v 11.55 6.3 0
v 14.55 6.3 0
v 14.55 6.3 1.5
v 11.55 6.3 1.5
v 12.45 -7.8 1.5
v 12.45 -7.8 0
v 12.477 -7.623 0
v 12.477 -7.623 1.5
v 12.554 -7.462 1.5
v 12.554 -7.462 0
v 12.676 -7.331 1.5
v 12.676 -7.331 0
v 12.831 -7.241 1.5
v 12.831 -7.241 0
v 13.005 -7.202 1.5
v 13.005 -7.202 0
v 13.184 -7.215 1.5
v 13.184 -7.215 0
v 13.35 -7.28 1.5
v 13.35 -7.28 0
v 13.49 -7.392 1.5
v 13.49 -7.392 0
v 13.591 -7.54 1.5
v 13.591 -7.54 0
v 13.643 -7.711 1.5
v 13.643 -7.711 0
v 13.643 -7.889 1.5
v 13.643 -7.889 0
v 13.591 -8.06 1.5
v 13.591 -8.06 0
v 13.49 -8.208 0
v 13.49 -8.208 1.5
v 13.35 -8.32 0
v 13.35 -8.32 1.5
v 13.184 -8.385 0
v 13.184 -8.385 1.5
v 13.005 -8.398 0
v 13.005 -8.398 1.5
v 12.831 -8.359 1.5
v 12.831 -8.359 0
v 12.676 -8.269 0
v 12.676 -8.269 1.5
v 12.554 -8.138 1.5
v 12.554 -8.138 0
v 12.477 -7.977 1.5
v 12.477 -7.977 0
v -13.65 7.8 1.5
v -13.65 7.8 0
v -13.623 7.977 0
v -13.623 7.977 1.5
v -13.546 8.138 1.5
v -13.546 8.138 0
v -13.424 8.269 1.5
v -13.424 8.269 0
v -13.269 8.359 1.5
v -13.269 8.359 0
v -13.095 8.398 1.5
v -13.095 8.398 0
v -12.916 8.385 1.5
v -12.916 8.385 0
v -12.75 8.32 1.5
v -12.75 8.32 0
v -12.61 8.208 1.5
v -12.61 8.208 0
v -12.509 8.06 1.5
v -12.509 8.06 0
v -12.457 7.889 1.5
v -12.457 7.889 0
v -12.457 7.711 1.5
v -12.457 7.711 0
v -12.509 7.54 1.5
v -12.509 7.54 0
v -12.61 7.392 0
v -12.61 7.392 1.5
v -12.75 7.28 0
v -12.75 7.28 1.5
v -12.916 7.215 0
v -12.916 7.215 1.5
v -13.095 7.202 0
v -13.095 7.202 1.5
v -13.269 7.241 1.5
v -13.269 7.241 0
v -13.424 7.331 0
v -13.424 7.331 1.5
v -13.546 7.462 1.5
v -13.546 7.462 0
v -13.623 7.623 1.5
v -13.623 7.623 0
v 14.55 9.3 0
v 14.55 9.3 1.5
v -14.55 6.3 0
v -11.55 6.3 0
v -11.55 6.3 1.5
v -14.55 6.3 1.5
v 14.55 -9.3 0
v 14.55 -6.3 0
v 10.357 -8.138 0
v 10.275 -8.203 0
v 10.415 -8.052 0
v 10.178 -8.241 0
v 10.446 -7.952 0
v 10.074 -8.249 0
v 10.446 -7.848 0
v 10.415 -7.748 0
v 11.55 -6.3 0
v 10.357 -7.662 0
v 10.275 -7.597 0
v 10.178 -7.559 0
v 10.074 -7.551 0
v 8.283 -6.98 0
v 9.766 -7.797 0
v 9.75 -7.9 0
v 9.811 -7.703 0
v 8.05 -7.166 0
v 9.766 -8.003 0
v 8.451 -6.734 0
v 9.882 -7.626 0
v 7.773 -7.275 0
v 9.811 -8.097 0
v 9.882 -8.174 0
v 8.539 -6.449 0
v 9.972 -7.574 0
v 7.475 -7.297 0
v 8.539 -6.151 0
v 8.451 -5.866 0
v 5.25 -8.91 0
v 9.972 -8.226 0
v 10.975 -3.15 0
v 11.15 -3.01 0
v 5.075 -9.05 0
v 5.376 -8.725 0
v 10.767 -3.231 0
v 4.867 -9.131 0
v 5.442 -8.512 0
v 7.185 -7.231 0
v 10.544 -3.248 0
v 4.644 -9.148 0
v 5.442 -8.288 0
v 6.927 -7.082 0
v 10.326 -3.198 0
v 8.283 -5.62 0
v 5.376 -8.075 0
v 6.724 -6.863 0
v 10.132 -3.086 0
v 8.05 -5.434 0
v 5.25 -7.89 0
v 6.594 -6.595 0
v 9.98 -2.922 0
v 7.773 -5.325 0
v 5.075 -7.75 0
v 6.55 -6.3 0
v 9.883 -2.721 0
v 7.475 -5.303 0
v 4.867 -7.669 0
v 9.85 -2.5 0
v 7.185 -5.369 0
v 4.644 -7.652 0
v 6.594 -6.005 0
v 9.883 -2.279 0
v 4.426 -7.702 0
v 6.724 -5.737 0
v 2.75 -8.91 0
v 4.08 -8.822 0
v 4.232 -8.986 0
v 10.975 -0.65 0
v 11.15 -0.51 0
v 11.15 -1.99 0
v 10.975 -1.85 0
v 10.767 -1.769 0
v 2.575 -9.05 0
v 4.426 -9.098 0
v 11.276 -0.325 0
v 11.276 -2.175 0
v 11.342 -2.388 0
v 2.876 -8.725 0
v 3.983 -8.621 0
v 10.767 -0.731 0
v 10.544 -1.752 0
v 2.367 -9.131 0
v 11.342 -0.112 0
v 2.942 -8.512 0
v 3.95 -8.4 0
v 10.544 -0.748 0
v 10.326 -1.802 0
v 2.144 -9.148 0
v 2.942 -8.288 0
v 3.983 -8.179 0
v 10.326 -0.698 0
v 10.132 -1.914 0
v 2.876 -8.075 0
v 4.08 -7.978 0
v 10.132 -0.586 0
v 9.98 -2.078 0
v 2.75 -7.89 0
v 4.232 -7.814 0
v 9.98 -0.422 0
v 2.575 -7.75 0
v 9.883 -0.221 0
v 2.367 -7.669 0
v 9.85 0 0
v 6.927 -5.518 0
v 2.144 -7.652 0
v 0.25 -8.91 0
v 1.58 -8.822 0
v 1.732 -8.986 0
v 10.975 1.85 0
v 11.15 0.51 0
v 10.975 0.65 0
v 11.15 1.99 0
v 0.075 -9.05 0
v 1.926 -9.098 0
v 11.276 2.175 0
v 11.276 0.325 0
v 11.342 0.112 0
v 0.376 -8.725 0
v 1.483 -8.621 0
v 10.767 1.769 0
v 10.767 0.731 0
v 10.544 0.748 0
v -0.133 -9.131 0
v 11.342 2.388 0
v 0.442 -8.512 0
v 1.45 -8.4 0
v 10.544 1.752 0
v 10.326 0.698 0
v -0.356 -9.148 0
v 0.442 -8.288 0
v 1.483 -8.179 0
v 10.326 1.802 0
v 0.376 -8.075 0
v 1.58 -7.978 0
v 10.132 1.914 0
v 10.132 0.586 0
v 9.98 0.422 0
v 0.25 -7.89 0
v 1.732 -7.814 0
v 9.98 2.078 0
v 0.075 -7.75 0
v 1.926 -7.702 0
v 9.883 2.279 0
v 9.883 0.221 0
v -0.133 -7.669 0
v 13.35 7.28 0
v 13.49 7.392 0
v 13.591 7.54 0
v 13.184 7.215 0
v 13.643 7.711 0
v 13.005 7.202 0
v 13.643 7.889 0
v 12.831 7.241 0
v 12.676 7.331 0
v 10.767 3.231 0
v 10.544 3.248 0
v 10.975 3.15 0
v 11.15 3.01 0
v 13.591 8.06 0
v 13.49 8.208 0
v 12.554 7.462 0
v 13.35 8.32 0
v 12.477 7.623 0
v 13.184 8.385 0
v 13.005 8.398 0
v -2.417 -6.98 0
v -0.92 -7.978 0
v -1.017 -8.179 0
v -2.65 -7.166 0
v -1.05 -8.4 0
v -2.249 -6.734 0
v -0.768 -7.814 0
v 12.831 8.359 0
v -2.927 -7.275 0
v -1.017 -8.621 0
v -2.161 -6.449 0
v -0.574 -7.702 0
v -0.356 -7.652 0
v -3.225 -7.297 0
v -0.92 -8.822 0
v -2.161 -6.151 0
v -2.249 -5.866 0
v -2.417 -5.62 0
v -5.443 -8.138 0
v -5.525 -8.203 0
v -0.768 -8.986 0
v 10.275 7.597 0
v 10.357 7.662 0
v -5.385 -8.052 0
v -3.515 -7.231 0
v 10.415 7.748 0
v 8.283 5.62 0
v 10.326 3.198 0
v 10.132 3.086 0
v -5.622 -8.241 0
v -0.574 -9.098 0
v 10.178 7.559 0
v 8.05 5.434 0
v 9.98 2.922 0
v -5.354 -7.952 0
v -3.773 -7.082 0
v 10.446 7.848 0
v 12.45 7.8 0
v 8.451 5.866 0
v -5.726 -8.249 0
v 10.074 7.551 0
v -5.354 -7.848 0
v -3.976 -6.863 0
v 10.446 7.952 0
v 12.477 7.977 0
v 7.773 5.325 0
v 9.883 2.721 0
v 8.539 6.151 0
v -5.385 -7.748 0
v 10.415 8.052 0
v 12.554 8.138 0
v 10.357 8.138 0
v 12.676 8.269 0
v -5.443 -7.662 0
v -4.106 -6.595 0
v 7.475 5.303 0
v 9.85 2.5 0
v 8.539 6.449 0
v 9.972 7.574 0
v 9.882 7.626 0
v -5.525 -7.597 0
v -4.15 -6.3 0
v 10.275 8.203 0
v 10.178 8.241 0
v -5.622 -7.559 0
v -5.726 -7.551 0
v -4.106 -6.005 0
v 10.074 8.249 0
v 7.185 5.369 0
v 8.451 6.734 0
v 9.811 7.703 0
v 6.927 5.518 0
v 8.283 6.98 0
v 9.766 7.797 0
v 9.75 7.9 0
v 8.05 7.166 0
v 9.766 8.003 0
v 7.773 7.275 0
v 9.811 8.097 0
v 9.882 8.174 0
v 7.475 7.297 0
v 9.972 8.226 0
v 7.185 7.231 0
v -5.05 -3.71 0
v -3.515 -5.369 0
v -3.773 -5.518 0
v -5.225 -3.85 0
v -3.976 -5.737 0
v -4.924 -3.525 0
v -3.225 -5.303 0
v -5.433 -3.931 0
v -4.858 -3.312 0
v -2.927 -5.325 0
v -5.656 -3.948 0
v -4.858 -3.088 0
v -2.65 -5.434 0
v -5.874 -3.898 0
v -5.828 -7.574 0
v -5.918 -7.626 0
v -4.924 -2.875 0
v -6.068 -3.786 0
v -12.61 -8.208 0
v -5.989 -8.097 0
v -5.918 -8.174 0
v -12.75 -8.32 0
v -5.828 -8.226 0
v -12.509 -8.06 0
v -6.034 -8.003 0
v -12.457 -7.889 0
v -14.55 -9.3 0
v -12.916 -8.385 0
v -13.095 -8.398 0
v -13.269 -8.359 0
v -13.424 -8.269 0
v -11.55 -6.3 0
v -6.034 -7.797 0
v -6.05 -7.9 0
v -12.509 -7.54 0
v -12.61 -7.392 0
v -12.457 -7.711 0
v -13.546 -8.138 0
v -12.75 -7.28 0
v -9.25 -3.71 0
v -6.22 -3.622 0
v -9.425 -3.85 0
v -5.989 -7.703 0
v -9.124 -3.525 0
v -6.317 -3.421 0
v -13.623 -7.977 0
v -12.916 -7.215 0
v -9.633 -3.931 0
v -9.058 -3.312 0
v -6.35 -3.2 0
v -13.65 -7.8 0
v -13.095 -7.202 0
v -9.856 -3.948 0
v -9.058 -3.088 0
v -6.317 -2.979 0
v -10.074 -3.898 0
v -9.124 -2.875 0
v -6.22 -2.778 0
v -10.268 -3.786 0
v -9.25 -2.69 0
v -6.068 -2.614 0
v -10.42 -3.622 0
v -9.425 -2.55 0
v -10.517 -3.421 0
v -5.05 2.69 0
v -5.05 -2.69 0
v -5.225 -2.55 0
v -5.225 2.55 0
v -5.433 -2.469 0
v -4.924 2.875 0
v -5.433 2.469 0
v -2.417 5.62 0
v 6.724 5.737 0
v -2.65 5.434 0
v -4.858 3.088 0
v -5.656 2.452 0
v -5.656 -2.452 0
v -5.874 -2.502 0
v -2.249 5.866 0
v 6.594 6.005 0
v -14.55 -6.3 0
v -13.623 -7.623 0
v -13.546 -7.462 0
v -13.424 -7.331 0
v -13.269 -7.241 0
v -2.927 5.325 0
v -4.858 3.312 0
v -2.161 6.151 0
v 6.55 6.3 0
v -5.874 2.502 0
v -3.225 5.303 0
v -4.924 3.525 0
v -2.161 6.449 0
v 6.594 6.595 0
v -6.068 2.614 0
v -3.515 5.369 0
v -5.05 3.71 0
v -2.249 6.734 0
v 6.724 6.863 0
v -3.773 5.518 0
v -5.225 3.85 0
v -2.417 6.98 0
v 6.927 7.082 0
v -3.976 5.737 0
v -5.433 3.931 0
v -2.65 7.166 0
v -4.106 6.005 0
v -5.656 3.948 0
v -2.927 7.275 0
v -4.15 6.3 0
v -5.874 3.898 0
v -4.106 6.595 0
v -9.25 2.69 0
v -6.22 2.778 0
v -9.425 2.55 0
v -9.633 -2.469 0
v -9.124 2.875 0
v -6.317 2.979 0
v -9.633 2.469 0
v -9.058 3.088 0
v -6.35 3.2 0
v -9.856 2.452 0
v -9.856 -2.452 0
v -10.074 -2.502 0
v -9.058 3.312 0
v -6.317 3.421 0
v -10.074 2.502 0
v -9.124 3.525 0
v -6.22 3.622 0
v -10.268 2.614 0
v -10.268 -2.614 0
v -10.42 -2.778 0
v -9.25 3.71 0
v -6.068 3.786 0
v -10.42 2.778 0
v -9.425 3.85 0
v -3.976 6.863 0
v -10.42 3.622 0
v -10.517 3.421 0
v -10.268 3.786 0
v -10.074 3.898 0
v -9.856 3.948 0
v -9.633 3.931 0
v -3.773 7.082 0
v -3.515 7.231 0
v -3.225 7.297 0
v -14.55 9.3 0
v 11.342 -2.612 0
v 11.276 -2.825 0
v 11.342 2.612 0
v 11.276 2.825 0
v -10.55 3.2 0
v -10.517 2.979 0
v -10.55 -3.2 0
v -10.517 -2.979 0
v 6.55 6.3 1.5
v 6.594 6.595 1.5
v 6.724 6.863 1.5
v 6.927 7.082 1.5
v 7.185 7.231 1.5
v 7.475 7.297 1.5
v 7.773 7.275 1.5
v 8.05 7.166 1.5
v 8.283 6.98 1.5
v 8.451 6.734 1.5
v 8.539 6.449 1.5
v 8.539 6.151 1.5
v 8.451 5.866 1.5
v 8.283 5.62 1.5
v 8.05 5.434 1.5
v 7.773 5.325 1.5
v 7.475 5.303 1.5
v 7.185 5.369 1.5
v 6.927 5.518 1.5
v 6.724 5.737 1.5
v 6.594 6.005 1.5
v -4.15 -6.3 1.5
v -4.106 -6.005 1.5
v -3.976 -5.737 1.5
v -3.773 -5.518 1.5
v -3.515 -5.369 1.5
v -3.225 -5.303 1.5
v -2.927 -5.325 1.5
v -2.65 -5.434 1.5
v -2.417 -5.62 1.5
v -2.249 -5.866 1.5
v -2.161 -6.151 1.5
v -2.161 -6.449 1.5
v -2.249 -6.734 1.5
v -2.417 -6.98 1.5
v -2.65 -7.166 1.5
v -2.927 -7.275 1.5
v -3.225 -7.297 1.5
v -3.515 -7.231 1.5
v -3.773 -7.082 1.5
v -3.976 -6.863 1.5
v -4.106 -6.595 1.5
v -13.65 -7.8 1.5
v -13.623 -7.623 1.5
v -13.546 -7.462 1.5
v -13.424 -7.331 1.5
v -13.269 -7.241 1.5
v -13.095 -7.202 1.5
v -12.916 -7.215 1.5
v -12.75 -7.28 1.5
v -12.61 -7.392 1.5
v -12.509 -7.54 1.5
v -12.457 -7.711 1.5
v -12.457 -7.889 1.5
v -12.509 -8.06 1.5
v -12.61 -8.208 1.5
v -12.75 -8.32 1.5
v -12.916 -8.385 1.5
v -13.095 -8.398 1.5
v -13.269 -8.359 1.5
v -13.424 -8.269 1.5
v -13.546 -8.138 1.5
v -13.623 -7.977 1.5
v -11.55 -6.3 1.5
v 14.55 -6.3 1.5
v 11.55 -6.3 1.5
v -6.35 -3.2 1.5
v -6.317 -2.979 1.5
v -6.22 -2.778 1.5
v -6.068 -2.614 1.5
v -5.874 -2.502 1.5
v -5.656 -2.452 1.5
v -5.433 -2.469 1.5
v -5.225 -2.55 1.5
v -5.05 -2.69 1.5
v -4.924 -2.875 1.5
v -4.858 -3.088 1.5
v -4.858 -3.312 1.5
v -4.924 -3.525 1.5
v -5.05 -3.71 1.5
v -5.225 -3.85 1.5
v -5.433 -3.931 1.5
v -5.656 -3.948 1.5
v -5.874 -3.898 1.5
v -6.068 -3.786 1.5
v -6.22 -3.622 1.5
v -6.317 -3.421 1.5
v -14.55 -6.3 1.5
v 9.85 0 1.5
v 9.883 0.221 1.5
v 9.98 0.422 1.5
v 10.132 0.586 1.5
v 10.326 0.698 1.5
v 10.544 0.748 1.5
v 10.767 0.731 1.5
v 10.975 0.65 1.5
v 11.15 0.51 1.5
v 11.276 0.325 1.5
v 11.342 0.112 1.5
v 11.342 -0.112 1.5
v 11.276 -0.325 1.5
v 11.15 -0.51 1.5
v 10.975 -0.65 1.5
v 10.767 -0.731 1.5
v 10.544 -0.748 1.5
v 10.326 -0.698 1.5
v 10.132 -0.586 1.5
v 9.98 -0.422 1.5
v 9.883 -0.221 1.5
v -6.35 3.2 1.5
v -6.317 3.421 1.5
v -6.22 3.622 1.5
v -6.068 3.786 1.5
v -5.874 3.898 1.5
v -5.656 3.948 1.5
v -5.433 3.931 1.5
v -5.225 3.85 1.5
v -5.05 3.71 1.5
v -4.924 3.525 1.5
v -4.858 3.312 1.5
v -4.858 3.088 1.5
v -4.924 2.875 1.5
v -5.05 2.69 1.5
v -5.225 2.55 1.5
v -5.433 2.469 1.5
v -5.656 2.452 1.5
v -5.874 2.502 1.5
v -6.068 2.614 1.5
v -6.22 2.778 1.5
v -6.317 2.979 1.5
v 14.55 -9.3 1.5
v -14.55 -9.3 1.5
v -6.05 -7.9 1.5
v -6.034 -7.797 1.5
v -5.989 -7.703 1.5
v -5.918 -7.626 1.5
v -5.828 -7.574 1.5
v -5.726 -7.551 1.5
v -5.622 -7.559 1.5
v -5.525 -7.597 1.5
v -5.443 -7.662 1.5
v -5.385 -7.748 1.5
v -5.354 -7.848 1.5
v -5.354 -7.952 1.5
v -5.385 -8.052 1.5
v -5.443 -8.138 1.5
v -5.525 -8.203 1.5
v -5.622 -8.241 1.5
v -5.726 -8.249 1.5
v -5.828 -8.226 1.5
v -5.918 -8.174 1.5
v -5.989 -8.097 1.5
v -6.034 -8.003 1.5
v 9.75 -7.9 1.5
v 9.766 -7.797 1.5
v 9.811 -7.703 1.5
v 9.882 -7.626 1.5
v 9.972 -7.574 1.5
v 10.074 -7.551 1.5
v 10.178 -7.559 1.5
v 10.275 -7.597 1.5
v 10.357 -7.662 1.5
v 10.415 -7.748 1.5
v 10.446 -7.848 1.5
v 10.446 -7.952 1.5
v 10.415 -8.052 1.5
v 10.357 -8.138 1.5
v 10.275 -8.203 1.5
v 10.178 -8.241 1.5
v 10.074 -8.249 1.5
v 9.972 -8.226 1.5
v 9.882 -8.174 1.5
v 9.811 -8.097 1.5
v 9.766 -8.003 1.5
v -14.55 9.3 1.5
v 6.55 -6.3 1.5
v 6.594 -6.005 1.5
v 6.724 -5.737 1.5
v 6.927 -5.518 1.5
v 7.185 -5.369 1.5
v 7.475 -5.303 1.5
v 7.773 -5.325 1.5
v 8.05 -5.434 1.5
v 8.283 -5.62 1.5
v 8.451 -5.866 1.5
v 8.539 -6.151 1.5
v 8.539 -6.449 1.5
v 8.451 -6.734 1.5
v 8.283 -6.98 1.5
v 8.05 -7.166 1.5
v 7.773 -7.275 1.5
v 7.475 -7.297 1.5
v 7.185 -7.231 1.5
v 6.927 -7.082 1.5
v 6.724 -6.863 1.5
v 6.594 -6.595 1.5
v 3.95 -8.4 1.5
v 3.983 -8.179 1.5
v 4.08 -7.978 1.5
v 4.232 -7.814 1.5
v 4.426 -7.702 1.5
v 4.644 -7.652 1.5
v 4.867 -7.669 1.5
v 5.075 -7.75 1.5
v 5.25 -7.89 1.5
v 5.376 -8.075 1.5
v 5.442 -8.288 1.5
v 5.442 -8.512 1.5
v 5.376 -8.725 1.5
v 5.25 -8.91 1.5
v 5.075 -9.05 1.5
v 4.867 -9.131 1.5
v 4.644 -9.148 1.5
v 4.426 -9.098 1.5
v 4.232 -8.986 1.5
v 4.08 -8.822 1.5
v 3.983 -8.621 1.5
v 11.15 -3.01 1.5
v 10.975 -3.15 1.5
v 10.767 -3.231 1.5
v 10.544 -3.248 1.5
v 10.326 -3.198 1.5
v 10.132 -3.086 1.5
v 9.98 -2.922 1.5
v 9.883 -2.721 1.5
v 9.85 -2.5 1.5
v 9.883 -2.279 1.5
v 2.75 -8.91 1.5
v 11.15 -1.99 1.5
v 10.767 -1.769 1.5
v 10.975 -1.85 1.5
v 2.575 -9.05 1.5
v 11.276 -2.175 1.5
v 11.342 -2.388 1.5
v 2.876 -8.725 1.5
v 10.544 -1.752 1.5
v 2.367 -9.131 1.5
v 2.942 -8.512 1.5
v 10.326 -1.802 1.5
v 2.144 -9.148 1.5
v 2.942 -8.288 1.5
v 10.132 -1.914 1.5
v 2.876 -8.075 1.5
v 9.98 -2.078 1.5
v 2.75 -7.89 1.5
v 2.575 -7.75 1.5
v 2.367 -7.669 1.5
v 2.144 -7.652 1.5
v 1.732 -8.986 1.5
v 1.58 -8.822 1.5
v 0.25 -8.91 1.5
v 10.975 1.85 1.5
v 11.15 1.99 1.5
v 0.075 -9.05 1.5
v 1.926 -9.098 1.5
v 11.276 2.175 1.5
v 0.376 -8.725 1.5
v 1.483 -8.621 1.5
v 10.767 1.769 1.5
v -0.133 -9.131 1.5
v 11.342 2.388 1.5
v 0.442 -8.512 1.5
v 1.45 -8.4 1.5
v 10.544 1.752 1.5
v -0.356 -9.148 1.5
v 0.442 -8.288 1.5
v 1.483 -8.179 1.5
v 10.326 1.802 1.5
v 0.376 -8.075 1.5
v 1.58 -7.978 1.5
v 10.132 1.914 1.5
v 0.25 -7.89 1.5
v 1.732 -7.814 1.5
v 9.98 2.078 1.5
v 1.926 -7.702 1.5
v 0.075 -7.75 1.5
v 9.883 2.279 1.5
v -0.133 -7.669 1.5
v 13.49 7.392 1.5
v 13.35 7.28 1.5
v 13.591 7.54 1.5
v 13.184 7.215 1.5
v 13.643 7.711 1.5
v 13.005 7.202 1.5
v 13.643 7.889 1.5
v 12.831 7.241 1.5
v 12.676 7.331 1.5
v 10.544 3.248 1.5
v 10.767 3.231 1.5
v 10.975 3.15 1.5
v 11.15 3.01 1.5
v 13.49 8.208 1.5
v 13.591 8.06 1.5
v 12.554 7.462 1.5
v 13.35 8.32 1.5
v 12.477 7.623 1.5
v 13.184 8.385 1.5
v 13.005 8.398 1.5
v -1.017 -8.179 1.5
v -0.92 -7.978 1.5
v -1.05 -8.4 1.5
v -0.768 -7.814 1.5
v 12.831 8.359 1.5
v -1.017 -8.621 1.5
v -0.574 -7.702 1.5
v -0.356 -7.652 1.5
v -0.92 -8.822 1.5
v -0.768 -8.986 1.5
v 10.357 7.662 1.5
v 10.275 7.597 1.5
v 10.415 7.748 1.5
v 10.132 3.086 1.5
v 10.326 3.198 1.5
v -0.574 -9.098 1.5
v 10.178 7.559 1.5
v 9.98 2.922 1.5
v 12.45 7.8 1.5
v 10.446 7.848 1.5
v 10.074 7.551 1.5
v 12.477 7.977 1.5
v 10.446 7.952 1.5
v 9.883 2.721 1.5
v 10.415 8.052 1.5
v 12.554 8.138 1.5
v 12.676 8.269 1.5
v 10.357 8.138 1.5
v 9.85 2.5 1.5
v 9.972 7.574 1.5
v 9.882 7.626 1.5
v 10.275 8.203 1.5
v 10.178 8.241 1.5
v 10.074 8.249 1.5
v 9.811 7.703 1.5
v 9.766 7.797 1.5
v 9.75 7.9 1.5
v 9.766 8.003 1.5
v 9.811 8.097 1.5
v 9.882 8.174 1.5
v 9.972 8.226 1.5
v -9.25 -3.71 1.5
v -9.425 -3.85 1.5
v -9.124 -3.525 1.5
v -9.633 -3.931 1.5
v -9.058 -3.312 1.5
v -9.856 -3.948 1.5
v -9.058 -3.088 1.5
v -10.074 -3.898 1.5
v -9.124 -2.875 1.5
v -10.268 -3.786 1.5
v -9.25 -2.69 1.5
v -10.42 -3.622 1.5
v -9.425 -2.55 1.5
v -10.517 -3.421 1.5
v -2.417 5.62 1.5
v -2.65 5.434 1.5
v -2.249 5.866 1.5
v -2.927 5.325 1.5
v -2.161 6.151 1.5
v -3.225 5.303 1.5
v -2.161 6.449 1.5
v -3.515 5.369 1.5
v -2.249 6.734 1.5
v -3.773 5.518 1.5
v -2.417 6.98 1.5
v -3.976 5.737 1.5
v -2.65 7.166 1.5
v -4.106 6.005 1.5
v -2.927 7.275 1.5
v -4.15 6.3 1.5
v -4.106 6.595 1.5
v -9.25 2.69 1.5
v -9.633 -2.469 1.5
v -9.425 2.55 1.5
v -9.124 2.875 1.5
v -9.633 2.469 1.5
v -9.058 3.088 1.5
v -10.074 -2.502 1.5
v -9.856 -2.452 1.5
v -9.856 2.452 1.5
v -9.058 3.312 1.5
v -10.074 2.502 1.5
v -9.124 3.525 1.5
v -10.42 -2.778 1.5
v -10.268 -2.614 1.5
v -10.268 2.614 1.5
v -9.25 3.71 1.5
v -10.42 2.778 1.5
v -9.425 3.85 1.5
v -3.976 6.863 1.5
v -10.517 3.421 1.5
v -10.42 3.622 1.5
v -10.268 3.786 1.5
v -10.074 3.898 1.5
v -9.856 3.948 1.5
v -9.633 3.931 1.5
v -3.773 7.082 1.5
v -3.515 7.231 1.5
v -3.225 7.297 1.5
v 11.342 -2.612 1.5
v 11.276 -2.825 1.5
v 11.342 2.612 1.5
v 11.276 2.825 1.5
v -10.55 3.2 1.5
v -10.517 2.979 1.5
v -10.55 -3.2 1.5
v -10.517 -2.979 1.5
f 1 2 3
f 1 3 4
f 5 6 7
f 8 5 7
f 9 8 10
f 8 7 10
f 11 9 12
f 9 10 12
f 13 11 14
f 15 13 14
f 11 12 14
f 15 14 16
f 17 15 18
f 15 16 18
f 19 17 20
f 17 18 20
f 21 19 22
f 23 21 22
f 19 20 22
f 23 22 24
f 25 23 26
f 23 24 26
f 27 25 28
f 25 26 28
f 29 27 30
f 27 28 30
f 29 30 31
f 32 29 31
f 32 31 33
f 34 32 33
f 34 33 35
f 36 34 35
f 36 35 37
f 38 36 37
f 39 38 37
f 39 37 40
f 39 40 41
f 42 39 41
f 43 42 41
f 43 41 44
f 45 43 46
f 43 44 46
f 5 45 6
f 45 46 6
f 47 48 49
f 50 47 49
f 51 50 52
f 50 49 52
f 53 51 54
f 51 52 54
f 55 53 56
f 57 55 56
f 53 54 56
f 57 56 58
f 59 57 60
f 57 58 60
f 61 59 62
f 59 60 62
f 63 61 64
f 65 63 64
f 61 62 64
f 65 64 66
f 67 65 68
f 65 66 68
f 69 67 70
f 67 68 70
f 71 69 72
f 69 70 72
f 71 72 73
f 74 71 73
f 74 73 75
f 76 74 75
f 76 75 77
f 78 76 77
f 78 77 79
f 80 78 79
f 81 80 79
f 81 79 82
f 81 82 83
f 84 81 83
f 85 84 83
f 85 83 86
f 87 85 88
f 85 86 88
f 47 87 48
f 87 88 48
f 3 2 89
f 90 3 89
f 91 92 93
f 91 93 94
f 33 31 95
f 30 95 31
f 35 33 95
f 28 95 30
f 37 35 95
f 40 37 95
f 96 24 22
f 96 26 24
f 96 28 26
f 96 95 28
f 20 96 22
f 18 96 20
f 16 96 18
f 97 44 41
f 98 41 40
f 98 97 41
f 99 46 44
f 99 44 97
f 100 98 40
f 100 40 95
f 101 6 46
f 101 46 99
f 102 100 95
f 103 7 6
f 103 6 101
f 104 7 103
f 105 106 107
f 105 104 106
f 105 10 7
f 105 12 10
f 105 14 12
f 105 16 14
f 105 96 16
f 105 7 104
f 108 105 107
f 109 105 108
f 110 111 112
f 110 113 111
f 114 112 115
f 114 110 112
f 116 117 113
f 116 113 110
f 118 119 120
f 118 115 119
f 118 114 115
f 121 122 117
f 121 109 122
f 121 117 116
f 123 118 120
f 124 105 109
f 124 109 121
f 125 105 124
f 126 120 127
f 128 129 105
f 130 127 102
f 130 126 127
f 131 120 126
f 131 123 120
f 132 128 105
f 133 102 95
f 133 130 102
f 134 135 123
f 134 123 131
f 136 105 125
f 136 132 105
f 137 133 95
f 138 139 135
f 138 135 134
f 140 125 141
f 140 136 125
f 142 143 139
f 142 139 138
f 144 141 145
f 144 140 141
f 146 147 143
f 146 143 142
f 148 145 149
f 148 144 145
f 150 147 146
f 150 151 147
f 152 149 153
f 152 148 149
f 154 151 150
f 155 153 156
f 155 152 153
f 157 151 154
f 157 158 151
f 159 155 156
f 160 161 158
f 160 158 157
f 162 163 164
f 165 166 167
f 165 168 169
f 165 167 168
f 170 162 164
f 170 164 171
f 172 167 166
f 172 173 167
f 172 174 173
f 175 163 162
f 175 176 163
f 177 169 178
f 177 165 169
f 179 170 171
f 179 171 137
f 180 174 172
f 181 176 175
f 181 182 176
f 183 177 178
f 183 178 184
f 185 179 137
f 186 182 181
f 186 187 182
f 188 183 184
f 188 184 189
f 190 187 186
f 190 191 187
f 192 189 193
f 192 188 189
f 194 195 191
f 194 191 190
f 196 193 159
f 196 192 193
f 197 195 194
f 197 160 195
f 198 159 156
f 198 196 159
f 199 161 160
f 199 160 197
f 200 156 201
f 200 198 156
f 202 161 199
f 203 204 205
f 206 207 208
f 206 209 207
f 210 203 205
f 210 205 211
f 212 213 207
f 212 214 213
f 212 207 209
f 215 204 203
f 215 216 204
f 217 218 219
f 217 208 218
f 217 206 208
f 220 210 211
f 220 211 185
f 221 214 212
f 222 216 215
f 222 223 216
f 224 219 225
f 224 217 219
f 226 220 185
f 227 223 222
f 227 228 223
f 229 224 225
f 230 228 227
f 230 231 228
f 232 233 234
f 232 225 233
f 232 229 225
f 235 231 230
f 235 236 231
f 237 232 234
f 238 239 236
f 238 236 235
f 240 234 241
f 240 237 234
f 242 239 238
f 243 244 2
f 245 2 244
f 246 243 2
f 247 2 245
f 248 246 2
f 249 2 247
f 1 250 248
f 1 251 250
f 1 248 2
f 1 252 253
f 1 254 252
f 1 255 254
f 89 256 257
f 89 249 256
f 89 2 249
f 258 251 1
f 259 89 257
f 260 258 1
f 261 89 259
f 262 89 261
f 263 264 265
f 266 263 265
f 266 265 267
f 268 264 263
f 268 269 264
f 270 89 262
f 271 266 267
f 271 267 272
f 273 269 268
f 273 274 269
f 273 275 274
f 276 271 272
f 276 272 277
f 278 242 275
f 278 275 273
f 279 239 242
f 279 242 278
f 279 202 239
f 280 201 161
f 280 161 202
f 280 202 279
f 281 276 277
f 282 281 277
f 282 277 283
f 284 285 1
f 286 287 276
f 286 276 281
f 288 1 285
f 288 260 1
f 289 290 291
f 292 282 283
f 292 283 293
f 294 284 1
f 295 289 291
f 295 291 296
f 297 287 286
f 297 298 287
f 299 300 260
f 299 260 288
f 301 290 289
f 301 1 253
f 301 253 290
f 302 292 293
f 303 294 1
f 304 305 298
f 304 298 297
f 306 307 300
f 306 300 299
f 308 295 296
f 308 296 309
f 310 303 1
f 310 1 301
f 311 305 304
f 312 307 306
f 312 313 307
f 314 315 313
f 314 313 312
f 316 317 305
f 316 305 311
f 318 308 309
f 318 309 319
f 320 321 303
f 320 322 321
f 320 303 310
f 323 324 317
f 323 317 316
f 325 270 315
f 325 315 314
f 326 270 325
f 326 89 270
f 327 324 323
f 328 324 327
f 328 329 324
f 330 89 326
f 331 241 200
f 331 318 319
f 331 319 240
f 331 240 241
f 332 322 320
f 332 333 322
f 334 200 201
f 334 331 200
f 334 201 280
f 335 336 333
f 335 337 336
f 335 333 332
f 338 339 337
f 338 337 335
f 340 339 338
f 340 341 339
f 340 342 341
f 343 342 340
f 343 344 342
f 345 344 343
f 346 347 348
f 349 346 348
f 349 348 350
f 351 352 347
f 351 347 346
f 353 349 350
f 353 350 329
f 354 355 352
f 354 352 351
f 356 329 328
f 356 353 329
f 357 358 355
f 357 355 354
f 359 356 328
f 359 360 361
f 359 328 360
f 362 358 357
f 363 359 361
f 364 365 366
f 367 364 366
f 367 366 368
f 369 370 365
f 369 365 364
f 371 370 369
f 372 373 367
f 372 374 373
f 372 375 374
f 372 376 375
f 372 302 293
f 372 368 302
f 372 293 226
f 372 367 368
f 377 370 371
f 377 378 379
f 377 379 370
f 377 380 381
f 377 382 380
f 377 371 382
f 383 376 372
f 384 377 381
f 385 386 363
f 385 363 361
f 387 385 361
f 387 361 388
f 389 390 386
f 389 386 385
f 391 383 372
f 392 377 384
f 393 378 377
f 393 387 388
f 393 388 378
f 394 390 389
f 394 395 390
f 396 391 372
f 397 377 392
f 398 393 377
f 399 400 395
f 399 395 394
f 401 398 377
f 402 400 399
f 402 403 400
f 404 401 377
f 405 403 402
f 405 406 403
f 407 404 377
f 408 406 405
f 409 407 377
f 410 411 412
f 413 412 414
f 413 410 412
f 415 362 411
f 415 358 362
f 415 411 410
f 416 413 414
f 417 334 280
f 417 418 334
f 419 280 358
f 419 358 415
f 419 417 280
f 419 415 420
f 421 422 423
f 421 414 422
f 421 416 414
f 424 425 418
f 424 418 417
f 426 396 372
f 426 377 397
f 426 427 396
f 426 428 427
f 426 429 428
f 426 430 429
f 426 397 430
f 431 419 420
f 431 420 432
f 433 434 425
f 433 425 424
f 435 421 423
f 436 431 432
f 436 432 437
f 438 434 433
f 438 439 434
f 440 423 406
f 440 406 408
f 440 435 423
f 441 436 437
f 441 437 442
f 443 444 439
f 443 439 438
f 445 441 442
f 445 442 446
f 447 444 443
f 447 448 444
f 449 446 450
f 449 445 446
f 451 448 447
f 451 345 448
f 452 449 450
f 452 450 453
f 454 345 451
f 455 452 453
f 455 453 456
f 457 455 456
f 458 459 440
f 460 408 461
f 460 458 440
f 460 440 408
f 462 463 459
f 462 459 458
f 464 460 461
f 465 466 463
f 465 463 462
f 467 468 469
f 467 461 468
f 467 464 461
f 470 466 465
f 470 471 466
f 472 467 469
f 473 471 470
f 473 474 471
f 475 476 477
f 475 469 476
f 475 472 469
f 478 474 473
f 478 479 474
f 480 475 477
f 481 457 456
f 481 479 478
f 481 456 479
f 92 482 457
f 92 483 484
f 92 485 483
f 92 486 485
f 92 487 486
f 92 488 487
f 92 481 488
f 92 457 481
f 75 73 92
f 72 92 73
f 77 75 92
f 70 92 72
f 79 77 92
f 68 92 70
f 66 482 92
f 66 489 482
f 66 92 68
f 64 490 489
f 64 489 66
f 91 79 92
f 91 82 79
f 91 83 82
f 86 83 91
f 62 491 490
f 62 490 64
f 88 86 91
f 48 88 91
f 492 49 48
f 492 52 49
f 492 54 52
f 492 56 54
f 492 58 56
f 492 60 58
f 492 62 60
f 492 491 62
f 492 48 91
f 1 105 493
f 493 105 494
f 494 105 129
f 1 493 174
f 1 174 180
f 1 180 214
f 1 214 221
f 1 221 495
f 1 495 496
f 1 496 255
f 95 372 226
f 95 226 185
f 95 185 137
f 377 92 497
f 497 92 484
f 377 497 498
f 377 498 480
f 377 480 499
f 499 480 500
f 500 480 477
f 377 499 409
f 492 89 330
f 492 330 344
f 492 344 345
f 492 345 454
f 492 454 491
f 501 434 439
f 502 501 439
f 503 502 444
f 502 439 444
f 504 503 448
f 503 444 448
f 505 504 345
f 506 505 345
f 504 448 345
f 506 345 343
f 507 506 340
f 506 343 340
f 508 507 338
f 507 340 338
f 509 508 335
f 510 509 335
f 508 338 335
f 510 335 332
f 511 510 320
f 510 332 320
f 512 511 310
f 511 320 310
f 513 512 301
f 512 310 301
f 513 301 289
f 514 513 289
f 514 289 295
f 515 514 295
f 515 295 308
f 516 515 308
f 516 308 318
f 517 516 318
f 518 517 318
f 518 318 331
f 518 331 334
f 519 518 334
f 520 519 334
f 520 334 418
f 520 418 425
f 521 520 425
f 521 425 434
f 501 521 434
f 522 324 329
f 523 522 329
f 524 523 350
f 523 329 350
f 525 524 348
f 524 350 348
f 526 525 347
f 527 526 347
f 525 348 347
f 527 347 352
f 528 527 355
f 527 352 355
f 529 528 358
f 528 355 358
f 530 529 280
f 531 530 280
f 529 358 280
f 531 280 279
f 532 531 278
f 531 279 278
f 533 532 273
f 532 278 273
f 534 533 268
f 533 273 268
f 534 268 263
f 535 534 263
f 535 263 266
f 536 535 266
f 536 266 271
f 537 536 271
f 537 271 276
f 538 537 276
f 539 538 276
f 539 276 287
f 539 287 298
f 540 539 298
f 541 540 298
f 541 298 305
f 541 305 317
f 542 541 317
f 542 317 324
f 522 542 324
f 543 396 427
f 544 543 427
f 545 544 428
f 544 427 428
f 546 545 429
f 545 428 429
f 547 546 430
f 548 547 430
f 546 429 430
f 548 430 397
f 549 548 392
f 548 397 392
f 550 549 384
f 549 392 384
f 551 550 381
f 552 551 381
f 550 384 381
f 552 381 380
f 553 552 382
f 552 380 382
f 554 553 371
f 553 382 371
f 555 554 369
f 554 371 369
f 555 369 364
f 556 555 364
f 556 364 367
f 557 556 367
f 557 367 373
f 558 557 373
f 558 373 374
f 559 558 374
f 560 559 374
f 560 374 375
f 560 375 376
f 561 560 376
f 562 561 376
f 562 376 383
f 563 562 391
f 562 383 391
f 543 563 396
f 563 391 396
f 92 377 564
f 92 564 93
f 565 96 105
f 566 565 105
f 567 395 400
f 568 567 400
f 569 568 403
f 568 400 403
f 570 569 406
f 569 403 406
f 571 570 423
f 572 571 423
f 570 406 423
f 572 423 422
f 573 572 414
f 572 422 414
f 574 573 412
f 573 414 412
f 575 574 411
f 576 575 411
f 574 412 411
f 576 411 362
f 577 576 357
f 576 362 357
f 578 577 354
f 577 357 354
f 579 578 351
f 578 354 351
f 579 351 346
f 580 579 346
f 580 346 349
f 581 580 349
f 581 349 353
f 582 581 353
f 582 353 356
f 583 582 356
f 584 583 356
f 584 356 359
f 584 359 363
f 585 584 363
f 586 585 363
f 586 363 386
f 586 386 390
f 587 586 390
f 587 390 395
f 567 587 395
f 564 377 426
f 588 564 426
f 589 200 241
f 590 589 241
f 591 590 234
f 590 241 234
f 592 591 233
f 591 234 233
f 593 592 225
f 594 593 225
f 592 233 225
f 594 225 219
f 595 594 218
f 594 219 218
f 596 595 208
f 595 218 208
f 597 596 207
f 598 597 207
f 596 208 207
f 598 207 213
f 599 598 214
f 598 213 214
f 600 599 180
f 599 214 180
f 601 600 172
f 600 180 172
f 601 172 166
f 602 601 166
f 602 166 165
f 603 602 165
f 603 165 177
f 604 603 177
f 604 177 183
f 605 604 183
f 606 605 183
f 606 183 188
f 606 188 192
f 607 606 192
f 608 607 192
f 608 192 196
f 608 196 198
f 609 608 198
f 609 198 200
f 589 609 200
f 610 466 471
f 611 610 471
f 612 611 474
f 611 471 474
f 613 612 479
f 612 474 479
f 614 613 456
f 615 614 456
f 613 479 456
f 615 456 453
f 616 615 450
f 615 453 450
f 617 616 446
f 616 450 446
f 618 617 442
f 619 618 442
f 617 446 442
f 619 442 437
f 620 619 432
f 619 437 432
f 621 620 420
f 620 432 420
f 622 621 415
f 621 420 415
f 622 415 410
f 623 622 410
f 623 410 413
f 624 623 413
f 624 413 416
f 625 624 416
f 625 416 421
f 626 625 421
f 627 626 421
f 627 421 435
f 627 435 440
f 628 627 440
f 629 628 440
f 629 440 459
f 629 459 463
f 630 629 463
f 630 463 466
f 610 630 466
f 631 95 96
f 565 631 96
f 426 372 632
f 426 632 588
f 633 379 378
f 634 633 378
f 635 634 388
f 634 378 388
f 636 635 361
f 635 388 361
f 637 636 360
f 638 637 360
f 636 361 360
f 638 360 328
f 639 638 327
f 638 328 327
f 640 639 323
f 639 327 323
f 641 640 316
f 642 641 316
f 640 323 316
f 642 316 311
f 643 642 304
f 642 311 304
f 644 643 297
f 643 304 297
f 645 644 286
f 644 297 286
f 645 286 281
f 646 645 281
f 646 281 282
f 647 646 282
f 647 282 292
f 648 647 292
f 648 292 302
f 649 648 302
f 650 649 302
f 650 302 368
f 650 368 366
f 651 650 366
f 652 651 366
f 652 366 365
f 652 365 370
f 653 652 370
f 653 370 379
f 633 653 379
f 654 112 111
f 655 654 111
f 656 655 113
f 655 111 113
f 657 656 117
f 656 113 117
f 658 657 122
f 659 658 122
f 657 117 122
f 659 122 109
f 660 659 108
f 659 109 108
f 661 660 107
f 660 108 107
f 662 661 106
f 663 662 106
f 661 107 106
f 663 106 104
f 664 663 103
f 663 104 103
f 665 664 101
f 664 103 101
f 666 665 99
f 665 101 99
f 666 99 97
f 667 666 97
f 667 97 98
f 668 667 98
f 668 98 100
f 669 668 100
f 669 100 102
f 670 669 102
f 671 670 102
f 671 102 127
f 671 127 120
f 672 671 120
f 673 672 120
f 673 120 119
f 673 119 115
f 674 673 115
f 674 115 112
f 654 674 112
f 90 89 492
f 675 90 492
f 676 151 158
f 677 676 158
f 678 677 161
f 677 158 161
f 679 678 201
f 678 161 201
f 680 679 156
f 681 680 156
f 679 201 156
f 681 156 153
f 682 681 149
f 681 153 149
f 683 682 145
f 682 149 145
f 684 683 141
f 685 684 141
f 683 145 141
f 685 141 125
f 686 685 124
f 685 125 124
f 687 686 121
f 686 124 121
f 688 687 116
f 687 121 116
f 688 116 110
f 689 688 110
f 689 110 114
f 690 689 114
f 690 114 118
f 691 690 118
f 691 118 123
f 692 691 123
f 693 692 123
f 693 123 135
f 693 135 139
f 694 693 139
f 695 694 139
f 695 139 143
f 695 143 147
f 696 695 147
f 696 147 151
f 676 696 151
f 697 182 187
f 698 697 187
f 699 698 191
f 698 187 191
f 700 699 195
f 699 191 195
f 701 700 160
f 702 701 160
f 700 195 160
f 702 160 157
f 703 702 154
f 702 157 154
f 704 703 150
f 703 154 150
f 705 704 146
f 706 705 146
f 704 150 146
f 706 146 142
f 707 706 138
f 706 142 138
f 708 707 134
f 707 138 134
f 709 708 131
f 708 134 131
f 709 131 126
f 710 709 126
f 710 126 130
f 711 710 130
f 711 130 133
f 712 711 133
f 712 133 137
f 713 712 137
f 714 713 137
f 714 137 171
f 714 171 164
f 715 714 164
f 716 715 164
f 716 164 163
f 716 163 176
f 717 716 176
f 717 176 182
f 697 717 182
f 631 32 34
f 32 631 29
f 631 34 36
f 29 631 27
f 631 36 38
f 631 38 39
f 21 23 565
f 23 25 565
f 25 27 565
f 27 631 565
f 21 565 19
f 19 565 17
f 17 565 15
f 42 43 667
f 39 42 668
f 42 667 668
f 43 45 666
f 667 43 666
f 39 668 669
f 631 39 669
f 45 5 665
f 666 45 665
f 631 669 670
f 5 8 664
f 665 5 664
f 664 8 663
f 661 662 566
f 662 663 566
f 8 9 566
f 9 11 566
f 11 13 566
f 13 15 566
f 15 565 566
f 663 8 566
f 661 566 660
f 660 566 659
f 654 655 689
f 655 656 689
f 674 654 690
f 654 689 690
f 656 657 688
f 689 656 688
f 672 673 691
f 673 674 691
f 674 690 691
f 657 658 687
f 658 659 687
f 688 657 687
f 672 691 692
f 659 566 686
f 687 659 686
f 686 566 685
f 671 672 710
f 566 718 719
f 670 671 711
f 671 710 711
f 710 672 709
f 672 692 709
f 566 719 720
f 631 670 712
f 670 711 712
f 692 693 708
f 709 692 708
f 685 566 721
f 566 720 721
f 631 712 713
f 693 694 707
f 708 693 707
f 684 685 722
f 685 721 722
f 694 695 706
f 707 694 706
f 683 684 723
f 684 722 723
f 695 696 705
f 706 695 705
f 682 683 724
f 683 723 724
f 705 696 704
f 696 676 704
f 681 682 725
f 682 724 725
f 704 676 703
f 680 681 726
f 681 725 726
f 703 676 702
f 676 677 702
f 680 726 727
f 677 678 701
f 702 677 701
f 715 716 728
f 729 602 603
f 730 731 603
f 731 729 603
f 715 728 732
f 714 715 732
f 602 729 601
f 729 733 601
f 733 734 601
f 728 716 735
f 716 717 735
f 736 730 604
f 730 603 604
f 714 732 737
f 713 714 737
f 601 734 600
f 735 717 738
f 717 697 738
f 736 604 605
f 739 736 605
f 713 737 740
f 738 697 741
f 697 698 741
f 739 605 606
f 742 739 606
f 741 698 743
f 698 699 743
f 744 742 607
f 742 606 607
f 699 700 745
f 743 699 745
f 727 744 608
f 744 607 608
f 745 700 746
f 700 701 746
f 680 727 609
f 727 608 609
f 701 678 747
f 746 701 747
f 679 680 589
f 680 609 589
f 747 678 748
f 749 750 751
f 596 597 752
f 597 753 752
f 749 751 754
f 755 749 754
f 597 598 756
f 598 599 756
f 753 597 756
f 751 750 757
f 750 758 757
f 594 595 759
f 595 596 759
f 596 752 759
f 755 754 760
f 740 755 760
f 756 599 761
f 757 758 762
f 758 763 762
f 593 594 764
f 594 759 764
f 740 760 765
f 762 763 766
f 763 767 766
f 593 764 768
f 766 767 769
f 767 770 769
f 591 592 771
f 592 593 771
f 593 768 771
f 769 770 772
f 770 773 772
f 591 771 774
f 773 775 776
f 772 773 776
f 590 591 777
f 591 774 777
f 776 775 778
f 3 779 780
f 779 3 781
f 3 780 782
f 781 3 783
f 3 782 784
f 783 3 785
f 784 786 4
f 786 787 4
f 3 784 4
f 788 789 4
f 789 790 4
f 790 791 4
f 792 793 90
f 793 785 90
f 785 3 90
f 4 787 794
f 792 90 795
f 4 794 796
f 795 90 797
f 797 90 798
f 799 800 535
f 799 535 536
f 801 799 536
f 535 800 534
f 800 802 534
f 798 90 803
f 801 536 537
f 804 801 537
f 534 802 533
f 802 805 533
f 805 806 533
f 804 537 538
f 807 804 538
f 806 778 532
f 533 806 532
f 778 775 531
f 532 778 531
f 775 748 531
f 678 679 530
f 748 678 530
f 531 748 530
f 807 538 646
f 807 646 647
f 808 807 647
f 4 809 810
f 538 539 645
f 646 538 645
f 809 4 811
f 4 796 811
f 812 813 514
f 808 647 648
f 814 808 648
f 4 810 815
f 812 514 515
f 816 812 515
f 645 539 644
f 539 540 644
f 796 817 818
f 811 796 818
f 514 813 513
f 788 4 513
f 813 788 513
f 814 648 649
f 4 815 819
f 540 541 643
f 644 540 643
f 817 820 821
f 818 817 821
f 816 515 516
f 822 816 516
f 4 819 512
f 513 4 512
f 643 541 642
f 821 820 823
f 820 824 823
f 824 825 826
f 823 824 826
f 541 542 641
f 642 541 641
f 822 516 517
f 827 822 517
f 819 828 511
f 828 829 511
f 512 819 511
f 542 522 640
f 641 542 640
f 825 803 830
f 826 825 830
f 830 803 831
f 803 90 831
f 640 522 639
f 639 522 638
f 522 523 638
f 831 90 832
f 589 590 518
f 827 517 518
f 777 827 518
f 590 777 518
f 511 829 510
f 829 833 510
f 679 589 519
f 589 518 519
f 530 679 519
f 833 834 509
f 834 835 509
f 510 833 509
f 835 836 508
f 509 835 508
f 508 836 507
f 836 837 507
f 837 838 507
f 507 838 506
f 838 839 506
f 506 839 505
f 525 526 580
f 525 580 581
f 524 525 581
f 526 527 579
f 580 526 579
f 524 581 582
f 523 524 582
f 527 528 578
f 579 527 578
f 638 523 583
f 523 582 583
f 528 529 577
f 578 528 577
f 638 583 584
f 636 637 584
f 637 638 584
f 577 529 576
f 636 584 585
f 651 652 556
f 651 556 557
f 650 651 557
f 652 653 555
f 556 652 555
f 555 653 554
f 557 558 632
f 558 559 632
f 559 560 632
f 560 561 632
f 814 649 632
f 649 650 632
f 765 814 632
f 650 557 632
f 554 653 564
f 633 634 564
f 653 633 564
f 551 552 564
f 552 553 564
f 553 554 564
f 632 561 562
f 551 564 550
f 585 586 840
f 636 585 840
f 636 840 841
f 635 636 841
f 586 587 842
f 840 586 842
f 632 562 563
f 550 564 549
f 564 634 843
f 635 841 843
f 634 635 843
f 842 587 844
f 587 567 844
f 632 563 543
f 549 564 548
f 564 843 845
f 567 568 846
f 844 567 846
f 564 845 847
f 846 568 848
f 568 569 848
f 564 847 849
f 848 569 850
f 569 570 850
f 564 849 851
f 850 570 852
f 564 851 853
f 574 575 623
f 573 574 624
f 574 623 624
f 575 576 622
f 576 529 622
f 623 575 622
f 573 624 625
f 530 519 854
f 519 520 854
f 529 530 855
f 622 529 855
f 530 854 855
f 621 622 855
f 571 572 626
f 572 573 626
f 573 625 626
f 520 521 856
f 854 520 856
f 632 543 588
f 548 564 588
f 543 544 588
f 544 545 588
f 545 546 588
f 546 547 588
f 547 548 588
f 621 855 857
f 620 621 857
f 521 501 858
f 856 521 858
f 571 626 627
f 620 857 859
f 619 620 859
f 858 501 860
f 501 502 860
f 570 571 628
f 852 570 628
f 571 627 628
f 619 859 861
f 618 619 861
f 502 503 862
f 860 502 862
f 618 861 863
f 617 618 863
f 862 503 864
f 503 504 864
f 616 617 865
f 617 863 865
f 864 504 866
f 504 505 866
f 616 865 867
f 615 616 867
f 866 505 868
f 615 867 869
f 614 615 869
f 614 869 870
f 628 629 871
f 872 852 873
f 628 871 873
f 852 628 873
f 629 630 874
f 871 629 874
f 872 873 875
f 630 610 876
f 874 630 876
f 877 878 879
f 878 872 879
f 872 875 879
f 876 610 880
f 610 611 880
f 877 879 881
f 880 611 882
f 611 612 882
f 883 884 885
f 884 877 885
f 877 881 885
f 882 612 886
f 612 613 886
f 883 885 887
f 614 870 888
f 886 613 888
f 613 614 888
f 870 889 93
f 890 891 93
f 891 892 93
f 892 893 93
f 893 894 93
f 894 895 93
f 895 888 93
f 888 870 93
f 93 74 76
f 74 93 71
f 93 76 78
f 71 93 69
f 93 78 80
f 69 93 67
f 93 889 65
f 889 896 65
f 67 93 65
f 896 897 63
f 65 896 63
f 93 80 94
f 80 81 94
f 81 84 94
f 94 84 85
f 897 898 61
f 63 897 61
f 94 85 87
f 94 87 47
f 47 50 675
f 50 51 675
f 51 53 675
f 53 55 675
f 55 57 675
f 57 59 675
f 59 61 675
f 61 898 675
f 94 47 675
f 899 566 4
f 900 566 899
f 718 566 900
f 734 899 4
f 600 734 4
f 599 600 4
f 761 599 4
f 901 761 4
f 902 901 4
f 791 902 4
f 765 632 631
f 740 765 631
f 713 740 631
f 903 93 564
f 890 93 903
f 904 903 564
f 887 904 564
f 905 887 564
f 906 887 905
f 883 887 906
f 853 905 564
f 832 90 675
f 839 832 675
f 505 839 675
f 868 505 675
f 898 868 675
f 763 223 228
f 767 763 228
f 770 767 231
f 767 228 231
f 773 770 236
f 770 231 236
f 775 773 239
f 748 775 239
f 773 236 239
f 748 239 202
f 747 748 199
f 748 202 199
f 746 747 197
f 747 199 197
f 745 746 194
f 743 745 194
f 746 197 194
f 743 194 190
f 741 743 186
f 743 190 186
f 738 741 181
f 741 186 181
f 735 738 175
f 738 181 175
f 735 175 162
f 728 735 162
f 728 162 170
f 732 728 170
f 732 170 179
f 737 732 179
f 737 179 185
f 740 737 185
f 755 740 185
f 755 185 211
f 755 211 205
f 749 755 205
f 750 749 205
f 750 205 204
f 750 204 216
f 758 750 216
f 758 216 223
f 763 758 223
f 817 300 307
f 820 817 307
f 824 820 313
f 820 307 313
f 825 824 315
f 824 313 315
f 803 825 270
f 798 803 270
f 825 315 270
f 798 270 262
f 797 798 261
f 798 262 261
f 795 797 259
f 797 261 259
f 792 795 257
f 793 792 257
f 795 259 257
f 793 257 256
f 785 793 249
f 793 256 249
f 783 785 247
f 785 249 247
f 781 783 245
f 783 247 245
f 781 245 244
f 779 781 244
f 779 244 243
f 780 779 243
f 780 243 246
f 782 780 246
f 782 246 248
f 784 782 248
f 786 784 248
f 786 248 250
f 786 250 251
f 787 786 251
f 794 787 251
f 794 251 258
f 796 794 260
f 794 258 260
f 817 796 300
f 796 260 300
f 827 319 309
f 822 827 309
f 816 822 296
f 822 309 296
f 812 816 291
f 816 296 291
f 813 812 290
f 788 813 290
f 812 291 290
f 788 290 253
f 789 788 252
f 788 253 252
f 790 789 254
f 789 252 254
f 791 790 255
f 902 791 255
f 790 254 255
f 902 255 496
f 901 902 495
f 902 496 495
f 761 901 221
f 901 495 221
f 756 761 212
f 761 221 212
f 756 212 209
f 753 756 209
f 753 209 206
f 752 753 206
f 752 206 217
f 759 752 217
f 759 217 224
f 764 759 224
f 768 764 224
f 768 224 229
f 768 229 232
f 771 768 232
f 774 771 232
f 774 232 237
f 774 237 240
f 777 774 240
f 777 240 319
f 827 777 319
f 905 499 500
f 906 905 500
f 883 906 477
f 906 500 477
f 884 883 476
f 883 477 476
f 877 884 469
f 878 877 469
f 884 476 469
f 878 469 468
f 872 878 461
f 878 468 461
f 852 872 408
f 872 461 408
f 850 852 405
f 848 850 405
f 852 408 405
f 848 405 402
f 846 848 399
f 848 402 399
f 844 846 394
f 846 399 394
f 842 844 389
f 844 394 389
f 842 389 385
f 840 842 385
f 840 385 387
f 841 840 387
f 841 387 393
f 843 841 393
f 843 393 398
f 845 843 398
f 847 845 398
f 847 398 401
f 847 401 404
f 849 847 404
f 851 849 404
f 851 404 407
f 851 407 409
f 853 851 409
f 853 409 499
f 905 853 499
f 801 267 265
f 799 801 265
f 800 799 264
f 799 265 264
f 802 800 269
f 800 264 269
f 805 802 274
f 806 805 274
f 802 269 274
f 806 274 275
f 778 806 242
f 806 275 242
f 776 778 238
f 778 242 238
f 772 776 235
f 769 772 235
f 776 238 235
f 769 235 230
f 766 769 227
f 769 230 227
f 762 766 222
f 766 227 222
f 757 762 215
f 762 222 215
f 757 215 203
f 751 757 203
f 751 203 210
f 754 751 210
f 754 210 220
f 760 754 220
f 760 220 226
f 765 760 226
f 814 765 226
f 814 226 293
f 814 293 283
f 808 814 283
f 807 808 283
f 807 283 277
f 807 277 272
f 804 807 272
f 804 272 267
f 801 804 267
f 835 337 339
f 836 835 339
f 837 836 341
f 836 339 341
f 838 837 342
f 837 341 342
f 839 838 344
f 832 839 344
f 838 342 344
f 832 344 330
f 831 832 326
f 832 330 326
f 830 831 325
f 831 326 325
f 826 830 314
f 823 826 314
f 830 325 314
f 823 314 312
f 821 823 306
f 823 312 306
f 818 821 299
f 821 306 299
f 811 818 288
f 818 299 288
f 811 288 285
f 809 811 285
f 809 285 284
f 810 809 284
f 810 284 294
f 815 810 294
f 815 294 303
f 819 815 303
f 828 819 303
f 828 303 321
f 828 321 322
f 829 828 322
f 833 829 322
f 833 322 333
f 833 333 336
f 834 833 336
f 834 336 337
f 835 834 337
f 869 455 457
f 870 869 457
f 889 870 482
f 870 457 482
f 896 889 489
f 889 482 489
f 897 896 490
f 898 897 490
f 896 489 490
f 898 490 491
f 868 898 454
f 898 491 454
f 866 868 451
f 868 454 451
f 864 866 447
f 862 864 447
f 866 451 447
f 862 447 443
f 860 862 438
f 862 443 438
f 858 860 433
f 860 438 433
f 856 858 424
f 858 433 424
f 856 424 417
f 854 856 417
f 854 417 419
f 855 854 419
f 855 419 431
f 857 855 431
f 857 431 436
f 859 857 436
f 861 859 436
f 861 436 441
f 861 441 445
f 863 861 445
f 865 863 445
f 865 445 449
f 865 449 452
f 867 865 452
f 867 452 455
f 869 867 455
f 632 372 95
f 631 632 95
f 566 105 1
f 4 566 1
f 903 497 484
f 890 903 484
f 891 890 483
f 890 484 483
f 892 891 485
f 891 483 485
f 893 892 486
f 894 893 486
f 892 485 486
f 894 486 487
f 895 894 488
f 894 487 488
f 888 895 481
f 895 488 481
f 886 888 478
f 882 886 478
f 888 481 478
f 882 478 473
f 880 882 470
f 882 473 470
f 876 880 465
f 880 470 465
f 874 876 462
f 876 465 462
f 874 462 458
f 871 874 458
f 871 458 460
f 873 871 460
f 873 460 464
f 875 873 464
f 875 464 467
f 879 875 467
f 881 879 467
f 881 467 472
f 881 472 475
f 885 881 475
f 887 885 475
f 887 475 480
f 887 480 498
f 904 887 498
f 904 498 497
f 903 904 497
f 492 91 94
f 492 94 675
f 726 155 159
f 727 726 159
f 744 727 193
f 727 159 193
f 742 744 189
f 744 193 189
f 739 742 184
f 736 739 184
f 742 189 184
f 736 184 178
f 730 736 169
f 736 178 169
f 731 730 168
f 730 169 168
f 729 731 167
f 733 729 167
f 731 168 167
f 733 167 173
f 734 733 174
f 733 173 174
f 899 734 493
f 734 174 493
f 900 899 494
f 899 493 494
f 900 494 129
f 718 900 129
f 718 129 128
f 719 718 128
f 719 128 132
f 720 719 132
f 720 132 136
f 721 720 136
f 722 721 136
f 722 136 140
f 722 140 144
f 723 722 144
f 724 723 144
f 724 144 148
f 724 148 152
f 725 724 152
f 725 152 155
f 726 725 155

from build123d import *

# Parameters (mm, degrees)
SKETCH_1_W          = 23.1
SKETCH_1_H          = 18.6
EXTRUDE_1_DEPTH     = 1.5
SKETCH_2_R          = 0.75
SKETCH_2_R_2        = 1
SKETCH_2_R_3        = 0.35
CUT_EXTRUDE_1_DEPTH = 15.904445646
SKETCH_3_W          = 3
SKETCH_3_H          = 3
SKETCH_3_R          = 0.6
EXTRUDE_2_DEPTH     = 1.5


with BuildPart() as part:
    # 草图1 → 凸台-拉伸1 (new body)
    with BuildSketch(Plane.XY):
        Rectangle(SKETCH_1_W, SKETCH_1_H)
    extrude(amount=EXTRUDE_1_DEPTH)

    # 草图2 → 切除-拉伸1 (cut, through all)
    with BuildSketch(Plane(origin=(0, 0, 0), x_dir=(-1, 0, 0), z_dir=(0, 0, -1))):
        with Locations((-10.6, 2.5)):
            Circle(SKETCH_2_R)
        with Locations((-10.6, 0)):
            Circle(SKETCH_2_R)
        with Locations((-10.6, -2.5)):
            Circle(SKETCH_2_R)
        with Locations((-7.55, -6.3)):
            Circle(SKETCH_2_R_2)
        with Locations((3.15, -6.3)):
            Circle(SKETCH_2_R_2)
        with Locations((-4.7, -8.4)):
            Circle(SKETCH_2_R)
        with Locations((-2.2, -8.4)):
            Circle(SKETCH_2_R)
        with Locations((0.3, -8.4)):
            Circle(SKETCH_2_R)
        with Locations((-7.55, 6.3)):
            Circle(SKETCH_2_R_2)
        with Locations((3.15, 6.3)):
            Circle(SKETCH_2_R_2)
        with Locations((5.6, 3.2)):
            Circle(SKETCH_2_R)
        with Locations((9.8, 3.2)):
            Circle(SKETCH_2_R)
        with Locations((5.6, -3.2)):
            Circle(SKETCH_2_R)
        with Locations((9.8, -3.2)):
            Circle(SKETCH_2_R)
        with Locations((5.7, -7.9)):
            Circle(SKETCH_2_R_3)
        with Locations((-10.1, -7.9)):
            Circle(SKETCH_2_R_3)
        with Locations((-10.1, 7.9)):
            Circle(SKETCH_2_R_3)
    extrude(amount=-CUT_EXTRUDE_1_DEPTH, mode=Mode.SUBTRACT)

    # 草图3 → 凸台-拉伸2 (add)
    # profile 1 of 4: a face of its own
    with BuildSketch(Plane(origin=(0, 0, 0), x_dir=(-1, 0, 0), z_dir=(0, 0, -1))):
        with Locations((-13.05, 7.8)):
            Rectangle(SKETCH_3_W, SKETCH_3_H)
        with Locations((-13.05, 7.8)):
            Circle(SKETCH_3_R, mode=Mode.SUBTRACT)
    # profile 2 of 4: a face of its own
    with BuildSketch(Plane(origin=(0, 0, 0), x_dir=(-1, 0, 0), z_dir=(0, 0, -1))):
        with Locations((-13.05, -7.8)):
            Rectangle(SKETCH_3_W, SKETCH_3_H)
        with Locations((-13.05, -7.8)):
            Circle(SKETCH_3_R, mode=Mode.SUBTRACT)
    # profile 3 of 4: a face of its own
    with BuildSketch(Plane(origin=(0, 0, 0), x_dir=(-1, 0, 0), z_dir=(0, 0, -1))):
        with Locations((13.05, 7.8)):
            Rectangle(SKETCH_3_W, SKETCH_3_H)
        with Locations((13.05, 7.8)):
            Circle(SKETCH_3_R, mode=Mode.SUBTRACT)
    # profile 4 of 4: a face of its own
    with BuildSketch(Plane(origin=(0, 0, 0), x_dir=(-1, 0, 0), z_dir=(0, 0, -1))):
        with Locations((13.05, -7.8)):
            Rectangle(SKETCH_3_W, SKETCH_3_H)
        with Locations((13.05, -7.8)):
            Circle(SKETCH_3_R, mode=Mode.SUBTRACT)
    extrude(amount=-EXTRUDE_2_DEPTH)


solid = part.part
